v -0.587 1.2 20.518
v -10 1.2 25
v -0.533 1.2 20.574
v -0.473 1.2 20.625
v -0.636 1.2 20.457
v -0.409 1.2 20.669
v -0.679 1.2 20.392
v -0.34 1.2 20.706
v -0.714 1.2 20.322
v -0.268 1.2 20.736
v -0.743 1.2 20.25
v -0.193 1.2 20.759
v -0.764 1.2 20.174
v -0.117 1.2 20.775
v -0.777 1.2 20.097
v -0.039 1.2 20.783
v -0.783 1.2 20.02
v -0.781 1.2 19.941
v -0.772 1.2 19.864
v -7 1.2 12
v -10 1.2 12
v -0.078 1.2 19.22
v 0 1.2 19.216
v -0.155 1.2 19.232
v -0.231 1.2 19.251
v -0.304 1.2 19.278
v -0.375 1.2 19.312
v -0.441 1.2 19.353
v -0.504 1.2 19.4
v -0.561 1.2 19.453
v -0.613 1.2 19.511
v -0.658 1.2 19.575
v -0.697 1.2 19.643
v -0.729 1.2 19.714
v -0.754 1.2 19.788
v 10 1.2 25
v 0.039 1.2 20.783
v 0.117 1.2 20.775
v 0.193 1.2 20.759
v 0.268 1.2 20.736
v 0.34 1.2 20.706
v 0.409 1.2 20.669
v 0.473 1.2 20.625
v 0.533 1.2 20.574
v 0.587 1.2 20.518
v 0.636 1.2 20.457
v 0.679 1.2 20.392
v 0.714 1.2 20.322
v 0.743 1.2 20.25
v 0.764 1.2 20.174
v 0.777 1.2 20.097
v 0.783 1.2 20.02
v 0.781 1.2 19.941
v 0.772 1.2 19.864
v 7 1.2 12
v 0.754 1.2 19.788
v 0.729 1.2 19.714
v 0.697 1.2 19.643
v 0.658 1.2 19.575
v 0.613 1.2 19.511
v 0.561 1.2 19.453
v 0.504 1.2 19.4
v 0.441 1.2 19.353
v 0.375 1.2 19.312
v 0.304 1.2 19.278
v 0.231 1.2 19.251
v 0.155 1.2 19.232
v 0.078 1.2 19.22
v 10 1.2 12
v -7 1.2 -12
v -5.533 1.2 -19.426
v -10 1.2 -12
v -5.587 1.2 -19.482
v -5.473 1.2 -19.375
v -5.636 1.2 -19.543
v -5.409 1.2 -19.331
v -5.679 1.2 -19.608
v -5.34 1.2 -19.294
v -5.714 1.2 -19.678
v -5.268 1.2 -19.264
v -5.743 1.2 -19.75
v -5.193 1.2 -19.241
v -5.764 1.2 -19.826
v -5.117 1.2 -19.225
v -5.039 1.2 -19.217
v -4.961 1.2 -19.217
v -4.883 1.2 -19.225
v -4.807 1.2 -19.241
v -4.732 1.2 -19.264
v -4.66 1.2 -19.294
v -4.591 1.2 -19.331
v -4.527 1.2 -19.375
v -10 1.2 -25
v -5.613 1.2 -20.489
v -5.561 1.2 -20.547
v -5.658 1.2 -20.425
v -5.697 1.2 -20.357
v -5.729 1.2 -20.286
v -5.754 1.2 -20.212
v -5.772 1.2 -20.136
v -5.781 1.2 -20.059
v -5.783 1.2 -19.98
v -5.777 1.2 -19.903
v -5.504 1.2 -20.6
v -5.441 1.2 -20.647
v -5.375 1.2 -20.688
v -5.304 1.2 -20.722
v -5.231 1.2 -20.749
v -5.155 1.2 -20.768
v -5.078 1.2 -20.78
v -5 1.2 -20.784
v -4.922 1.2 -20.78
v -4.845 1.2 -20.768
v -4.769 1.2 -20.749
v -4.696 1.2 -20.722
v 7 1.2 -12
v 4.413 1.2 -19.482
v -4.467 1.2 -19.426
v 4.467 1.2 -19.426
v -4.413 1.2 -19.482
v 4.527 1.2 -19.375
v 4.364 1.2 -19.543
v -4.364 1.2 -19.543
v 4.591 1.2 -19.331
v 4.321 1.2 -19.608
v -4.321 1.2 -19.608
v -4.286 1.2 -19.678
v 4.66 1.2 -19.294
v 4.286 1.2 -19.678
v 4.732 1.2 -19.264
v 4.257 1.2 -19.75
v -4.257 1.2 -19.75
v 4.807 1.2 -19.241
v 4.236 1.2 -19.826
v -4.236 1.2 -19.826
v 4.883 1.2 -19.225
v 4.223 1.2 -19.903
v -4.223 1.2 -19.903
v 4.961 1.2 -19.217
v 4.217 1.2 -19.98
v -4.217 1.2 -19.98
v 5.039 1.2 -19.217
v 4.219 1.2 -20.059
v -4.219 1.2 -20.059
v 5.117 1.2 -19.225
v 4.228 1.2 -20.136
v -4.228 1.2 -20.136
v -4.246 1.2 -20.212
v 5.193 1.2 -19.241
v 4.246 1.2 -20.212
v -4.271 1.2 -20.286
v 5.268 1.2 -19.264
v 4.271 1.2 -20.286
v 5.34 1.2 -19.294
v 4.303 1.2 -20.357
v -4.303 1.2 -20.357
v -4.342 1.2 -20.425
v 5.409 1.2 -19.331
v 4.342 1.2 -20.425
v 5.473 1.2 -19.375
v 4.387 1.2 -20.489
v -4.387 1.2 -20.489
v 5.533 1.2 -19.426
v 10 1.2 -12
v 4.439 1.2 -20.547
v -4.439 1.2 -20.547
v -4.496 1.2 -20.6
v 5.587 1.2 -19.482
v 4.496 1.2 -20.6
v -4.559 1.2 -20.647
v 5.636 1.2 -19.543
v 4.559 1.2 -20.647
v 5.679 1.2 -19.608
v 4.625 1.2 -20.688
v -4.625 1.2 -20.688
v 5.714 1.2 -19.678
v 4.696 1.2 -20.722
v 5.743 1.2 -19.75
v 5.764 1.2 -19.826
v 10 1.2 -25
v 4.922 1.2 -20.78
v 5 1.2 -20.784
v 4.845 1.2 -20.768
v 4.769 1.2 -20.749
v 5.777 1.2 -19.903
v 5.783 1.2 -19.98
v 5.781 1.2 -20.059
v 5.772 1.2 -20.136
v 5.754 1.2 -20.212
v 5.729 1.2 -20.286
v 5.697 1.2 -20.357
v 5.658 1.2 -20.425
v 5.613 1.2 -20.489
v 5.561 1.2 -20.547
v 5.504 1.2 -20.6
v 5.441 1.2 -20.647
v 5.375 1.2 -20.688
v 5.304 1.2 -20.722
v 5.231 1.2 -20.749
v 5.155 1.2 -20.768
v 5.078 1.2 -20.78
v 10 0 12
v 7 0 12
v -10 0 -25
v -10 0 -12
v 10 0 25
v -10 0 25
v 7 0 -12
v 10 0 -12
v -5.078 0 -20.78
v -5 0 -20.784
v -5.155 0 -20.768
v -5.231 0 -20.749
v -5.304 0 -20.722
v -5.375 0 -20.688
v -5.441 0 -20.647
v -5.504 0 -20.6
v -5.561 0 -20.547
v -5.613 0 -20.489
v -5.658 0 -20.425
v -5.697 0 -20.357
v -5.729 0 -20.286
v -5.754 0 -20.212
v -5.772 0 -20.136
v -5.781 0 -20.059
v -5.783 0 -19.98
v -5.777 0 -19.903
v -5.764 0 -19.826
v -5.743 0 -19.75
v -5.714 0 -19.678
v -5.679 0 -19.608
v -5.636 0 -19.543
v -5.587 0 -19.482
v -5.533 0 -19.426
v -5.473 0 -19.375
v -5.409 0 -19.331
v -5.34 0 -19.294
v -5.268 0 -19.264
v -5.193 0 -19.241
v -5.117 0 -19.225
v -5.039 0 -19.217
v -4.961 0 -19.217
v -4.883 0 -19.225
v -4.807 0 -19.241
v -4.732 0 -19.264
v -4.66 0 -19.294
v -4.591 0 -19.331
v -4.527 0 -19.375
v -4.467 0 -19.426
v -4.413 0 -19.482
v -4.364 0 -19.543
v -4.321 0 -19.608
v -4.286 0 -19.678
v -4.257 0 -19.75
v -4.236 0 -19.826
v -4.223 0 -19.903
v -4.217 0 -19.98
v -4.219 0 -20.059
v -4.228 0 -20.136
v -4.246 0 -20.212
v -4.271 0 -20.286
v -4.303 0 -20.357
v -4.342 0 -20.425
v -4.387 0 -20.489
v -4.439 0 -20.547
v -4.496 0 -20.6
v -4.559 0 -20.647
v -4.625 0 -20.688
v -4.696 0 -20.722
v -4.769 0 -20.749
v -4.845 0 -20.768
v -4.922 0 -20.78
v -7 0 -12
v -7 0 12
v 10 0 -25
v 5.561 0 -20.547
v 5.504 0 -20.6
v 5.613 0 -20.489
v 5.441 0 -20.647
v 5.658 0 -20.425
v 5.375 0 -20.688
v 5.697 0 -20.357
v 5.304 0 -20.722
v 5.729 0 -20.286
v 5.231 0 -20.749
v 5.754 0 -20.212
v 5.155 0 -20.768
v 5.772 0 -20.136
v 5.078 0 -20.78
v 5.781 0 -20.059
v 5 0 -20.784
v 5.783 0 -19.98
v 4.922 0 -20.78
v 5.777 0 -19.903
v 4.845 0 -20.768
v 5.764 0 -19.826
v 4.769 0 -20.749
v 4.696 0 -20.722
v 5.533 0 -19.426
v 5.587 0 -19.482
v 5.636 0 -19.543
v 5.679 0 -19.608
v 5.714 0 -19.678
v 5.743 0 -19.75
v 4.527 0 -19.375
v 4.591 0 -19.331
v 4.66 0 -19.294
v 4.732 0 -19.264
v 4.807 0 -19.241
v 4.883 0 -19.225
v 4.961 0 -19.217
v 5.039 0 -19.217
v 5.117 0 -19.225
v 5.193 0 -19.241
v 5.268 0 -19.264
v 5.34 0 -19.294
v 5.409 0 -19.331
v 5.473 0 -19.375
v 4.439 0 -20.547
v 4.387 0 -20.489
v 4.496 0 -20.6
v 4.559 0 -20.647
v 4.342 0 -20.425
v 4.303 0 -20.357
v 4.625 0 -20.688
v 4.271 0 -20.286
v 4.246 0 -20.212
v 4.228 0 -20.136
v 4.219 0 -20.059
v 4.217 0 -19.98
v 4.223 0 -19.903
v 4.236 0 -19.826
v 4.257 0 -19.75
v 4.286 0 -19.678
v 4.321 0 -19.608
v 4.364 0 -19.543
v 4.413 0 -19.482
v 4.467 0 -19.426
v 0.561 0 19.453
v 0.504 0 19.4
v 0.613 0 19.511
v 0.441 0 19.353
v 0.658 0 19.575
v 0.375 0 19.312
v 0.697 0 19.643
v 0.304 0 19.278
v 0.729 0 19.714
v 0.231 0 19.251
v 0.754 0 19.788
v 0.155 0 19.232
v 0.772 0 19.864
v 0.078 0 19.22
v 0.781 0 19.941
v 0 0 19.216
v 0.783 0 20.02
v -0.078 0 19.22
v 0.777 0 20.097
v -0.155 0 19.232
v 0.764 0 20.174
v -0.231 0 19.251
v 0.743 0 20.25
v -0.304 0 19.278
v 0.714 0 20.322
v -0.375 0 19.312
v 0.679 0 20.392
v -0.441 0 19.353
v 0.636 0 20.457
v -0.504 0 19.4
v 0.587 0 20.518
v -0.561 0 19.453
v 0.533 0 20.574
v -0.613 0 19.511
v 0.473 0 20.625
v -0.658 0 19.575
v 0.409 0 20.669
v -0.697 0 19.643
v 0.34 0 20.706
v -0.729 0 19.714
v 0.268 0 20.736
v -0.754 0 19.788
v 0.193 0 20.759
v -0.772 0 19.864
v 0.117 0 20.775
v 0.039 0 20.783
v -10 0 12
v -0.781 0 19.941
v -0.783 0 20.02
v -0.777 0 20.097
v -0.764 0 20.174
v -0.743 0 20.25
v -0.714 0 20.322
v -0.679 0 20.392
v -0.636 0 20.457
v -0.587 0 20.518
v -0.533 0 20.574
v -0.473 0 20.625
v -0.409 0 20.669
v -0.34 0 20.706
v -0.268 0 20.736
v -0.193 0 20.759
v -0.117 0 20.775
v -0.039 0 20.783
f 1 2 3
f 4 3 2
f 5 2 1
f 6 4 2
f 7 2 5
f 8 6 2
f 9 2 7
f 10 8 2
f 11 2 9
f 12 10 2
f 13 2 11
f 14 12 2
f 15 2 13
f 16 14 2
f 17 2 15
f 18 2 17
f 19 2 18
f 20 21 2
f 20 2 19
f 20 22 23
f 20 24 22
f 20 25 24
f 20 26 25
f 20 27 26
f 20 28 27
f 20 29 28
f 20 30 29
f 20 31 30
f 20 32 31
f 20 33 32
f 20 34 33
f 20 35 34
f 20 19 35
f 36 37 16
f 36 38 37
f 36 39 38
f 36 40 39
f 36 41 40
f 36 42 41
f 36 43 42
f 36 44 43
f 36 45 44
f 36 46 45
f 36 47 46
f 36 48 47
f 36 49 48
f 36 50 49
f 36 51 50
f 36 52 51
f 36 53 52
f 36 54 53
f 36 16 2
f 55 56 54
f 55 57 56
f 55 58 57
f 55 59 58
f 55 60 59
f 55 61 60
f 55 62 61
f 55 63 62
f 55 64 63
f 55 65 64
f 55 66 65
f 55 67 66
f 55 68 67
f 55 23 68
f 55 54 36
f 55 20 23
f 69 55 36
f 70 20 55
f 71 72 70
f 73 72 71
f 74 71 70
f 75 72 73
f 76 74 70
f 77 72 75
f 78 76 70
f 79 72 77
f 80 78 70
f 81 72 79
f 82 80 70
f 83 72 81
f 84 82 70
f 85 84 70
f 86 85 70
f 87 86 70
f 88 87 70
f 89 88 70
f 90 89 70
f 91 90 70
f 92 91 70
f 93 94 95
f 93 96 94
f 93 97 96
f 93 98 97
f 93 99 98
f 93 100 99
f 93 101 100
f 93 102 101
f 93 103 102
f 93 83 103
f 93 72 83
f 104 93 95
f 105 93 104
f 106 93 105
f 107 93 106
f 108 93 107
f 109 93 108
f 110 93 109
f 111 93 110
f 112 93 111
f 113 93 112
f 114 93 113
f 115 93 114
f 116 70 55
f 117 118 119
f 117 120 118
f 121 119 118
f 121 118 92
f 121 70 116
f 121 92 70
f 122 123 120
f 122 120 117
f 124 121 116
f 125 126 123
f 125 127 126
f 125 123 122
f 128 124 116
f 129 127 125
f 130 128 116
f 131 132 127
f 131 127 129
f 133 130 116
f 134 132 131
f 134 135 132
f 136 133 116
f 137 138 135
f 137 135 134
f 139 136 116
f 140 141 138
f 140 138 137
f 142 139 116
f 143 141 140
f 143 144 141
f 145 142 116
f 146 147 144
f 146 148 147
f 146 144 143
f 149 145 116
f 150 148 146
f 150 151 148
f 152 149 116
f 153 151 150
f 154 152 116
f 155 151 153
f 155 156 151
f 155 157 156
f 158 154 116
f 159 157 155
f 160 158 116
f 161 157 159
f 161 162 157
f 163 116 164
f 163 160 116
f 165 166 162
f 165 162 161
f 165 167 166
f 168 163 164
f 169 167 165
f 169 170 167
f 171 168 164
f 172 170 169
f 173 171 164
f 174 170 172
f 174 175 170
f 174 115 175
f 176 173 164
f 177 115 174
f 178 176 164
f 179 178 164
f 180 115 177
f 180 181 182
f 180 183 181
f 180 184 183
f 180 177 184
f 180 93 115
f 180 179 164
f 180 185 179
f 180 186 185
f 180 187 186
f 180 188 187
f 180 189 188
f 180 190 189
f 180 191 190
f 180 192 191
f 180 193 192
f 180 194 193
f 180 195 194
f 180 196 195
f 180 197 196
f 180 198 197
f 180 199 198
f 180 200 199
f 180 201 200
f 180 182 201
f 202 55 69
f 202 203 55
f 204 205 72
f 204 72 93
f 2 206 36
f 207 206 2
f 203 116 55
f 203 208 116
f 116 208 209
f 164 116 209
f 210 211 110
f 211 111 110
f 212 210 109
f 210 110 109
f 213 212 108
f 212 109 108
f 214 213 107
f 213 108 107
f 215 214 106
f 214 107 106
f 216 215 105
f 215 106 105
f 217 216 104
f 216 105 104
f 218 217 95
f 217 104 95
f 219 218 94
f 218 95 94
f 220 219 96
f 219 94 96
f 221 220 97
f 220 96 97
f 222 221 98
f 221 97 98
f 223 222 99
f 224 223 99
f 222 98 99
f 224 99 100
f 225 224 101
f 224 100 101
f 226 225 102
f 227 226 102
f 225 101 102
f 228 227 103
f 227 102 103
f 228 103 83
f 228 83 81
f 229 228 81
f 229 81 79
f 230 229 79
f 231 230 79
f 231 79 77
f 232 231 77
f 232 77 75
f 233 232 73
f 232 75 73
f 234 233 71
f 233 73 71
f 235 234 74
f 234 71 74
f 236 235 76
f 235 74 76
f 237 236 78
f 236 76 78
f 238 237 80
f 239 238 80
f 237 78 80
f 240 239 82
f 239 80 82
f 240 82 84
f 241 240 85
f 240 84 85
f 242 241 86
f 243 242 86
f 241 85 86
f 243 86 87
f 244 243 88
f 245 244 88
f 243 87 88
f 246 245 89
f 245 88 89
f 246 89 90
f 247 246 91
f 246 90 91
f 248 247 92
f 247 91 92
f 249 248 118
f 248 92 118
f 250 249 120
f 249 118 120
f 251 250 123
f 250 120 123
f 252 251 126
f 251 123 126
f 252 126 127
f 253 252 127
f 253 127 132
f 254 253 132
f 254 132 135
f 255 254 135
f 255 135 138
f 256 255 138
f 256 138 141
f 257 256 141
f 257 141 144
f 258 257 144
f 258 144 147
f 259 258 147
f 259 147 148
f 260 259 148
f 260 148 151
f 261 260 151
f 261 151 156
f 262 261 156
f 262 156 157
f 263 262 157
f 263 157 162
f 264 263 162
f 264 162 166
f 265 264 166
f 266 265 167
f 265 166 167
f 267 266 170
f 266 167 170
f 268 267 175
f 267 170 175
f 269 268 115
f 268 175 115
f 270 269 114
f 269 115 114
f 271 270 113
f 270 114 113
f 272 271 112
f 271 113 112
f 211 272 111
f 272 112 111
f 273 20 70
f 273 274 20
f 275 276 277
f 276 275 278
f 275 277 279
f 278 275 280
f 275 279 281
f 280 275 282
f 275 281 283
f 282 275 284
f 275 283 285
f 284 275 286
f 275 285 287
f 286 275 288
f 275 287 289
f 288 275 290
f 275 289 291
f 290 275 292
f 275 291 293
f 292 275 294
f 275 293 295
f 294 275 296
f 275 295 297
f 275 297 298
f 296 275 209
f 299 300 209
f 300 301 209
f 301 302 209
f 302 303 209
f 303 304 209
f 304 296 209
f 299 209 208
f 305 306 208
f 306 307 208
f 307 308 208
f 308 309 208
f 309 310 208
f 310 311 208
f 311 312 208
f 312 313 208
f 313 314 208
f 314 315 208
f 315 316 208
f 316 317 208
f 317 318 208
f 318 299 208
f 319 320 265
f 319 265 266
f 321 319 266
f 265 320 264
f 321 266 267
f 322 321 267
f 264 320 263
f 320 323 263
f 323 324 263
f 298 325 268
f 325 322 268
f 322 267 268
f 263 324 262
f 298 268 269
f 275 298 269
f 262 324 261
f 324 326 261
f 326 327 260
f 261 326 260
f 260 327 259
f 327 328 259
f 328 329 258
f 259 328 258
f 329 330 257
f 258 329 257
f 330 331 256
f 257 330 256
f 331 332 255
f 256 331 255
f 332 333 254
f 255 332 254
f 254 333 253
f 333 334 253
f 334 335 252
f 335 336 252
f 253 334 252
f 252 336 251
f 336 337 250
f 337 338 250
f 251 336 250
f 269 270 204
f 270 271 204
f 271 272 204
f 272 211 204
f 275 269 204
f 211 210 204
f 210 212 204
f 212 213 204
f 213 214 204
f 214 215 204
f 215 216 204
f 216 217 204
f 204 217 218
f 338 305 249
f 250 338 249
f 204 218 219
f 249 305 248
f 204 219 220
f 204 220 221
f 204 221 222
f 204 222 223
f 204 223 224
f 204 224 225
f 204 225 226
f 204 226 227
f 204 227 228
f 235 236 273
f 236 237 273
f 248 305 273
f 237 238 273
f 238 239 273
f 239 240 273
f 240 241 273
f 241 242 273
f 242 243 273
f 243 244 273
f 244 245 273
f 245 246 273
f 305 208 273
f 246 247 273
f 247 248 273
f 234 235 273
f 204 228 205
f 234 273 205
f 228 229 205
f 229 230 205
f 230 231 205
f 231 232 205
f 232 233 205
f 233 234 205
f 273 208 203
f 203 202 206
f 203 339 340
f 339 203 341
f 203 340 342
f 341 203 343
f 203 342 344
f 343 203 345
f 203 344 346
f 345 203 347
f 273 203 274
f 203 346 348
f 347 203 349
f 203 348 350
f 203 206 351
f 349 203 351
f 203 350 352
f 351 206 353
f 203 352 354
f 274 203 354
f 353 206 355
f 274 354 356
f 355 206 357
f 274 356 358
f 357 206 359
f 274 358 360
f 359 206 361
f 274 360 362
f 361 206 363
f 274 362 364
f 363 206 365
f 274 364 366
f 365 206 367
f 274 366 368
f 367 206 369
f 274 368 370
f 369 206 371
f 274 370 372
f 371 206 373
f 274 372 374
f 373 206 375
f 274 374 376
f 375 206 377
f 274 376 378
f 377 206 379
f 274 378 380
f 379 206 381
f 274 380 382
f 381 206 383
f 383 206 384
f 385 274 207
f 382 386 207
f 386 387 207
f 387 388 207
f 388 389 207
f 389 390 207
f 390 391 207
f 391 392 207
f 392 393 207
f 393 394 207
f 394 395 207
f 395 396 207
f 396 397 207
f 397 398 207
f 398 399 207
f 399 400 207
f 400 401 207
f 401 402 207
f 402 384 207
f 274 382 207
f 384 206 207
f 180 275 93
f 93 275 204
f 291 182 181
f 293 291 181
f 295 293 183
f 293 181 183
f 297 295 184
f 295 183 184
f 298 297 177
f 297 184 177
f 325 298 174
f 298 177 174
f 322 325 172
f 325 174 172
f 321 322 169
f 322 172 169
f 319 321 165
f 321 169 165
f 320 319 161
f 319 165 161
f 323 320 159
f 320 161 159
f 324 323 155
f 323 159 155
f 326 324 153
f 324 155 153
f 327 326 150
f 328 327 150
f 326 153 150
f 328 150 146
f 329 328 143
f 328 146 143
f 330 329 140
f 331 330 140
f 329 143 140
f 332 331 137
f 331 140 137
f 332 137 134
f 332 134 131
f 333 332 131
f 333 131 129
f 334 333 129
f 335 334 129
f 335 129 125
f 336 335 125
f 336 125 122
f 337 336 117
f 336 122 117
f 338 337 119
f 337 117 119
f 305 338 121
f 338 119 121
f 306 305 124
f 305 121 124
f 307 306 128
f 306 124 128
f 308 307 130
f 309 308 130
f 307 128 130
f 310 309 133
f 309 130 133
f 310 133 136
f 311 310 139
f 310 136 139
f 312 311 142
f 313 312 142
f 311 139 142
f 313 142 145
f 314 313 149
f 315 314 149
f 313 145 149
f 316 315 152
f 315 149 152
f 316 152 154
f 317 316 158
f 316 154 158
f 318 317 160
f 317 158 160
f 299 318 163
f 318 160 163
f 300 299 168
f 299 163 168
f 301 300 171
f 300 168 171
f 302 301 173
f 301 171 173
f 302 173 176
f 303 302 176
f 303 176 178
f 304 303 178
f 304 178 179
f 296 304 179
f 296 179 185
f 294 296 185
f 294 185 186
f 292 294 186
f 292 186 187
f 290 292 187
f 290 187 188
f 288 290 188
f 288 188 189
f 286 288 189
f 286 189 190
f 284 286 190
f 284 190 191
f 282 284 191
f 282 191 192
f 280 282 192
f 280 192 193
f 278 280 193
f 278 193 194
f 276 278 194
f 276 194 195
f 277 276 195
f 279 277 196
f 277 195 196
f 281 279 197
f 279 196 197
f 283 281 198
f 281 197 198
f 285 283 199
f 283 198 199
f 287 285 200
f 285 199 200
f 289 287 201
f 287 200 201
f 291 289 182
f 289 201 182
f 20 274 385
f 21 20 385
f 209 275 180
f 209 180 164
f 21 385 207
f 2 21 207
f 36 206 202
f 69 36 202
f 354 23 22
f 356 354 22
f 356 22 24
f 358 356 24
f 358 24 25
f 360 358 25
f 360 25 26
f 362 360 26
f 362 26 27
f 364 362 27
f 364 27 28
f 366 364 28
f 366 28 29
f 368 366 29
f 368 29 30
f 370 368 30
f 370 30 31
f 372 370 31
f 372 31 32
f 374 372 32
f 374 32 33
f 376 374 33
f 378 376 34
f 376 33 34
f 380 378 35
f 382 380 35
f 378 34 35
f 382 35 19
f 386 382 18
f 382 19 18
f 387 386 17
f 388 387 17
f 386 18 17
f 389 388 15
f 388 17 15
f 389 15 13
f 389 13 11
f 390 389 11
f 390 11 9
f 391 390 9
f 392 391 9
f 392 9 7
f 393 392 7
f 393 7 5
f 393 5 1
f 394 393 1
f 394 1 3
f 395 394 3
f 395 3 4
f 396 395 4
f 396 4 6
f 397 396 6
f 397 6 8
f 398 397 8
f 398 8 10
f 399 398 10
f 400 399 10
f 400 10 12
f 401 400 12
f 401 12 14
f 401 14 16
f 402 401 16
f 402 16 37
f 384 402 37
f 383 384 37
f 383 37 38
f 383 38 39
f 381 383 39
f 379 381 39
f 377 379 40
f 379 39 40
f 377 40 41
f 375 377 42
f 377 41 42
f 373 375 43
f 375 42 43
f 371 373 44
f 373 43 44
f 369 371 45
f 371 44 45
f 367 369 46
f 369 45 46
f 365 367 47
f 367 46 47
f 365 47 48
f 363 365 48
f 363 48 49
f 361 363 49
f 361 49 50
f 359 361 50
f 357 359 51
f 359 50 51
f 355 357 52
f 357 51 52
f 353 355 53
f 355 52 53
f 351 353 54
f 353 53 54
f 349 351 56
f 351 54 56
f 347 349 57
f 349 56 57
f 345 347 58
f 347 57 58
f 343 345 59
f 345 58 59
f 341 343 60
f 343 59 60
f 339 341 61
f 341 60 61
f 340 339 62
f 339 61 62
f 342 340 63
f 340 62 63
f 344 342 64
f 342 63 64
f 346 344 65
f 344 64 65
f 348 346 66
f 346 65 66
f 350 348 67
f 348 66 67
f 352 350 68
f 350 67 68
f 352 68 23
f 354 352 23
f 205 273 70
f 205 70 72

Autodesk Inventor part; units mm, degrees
ref_plane "YZ Plane" through (0, 0, 0) normal (1, 0, 0) x (0, 1, 0)
ref_plane "XZ Plane" through (0, 0, 0) normal (0, 1, 0) x (-1, 0, 0)
ref_plane "XY Plane" through (0, 0, 0) normal (0, 0, 1) x (1, 0, 0)
sketch "Sketch1" plane through (0, 0, 0) normal (0, 1, 0) x (-1, 0, 0)
  line L0 (7, 12) -> (10, 12)
  line L1 (-7, 12) -> (-10, 12)
  line L2 (-10, 25) -> (-10, 12)
  line L3 (10, 12) -> (10, 25)
  line L4 (-10, 25) -> (10, 25)
  line L5 (7, 0) -> (-7, 0) construction
  line L6 (-7, 12) -> (-7, 0)
  line L7 (7, 12) -> (7, 0)
  line L8 (-10, 20) -> (0, 20) construction
  line L9 (-10, 20) -> (-5, 20) construction
  line L10 (10, 20) -> (5, 20) construction
  line L11 (7, -12) -> (10, -12)
  line L12 (-7, -12) -> (-10, -12)
  line L13 (-10, -25) -> (-10, -12)
  line L14 (10, -12) -> (10, -25)
  line L15 (-10, -25) -> (10, -25)
  line L16 (-7, -12) -> (-7, 0)
  line L17 (7, -12) -> (7, 0)
  line L18 (-10, -20) -> (0, -20) construction
  line L19 (-10, -20) -> (-5, -20) construction
  line L20 (10, -20) -> (5, -20) construction
  point P0 (0, 0)
  dimension "d39" = 12
  dimension "d40" = 13
  dimension "d41" = 20
extrude "Extrusion1" add sketch "Sketch1" along normal blind 1
sketch "Sketch2" plane through (0, 1, 0) normal (0, 1, 0) x (1, 0, 0)
  line L0 (-10, -12) -> (-10, -25) projected
  line L1 (-10, -25) -> (-10, -12) projected
  line L2 (-10, -12) -> (-7, -12) projected
  line L3 (7, -12) -> (10, -12) projected
  line L4 (10, -12) -> (10, -25) projected
  line L5 (-7, -12) -> (-7, 12) projected
  line L6 (7, 12) -> (7, -12) projected
  line L7 (10, -25) -> (-10, -25) projected
  line L8 (-7, 12) -> (-10, 12) projected
  line L9 (-10, 12) -> (-10, 25) projected
  line L10 (-10, 25) -> (10, 25) projected
  line L11 (10, 25) -> (10, 12) projected
  line L12 (10, 12) -> (7, 12) projected
  point P0 (0, 0)
  point P1 (-10, -40)
extrude "Extrusion2" add sketch "Sketch2" along normal blind 0.2
hole "Hole3" at (-5, 0, -20) at (5, 0, -20) at (0, 0, 20) direction (0, 1, 0) diameter 1.567 end through all thread size "M2x0.4" class "6H" standard "ISO Metric profile"
properties part number "PCB-blank-20x20"
